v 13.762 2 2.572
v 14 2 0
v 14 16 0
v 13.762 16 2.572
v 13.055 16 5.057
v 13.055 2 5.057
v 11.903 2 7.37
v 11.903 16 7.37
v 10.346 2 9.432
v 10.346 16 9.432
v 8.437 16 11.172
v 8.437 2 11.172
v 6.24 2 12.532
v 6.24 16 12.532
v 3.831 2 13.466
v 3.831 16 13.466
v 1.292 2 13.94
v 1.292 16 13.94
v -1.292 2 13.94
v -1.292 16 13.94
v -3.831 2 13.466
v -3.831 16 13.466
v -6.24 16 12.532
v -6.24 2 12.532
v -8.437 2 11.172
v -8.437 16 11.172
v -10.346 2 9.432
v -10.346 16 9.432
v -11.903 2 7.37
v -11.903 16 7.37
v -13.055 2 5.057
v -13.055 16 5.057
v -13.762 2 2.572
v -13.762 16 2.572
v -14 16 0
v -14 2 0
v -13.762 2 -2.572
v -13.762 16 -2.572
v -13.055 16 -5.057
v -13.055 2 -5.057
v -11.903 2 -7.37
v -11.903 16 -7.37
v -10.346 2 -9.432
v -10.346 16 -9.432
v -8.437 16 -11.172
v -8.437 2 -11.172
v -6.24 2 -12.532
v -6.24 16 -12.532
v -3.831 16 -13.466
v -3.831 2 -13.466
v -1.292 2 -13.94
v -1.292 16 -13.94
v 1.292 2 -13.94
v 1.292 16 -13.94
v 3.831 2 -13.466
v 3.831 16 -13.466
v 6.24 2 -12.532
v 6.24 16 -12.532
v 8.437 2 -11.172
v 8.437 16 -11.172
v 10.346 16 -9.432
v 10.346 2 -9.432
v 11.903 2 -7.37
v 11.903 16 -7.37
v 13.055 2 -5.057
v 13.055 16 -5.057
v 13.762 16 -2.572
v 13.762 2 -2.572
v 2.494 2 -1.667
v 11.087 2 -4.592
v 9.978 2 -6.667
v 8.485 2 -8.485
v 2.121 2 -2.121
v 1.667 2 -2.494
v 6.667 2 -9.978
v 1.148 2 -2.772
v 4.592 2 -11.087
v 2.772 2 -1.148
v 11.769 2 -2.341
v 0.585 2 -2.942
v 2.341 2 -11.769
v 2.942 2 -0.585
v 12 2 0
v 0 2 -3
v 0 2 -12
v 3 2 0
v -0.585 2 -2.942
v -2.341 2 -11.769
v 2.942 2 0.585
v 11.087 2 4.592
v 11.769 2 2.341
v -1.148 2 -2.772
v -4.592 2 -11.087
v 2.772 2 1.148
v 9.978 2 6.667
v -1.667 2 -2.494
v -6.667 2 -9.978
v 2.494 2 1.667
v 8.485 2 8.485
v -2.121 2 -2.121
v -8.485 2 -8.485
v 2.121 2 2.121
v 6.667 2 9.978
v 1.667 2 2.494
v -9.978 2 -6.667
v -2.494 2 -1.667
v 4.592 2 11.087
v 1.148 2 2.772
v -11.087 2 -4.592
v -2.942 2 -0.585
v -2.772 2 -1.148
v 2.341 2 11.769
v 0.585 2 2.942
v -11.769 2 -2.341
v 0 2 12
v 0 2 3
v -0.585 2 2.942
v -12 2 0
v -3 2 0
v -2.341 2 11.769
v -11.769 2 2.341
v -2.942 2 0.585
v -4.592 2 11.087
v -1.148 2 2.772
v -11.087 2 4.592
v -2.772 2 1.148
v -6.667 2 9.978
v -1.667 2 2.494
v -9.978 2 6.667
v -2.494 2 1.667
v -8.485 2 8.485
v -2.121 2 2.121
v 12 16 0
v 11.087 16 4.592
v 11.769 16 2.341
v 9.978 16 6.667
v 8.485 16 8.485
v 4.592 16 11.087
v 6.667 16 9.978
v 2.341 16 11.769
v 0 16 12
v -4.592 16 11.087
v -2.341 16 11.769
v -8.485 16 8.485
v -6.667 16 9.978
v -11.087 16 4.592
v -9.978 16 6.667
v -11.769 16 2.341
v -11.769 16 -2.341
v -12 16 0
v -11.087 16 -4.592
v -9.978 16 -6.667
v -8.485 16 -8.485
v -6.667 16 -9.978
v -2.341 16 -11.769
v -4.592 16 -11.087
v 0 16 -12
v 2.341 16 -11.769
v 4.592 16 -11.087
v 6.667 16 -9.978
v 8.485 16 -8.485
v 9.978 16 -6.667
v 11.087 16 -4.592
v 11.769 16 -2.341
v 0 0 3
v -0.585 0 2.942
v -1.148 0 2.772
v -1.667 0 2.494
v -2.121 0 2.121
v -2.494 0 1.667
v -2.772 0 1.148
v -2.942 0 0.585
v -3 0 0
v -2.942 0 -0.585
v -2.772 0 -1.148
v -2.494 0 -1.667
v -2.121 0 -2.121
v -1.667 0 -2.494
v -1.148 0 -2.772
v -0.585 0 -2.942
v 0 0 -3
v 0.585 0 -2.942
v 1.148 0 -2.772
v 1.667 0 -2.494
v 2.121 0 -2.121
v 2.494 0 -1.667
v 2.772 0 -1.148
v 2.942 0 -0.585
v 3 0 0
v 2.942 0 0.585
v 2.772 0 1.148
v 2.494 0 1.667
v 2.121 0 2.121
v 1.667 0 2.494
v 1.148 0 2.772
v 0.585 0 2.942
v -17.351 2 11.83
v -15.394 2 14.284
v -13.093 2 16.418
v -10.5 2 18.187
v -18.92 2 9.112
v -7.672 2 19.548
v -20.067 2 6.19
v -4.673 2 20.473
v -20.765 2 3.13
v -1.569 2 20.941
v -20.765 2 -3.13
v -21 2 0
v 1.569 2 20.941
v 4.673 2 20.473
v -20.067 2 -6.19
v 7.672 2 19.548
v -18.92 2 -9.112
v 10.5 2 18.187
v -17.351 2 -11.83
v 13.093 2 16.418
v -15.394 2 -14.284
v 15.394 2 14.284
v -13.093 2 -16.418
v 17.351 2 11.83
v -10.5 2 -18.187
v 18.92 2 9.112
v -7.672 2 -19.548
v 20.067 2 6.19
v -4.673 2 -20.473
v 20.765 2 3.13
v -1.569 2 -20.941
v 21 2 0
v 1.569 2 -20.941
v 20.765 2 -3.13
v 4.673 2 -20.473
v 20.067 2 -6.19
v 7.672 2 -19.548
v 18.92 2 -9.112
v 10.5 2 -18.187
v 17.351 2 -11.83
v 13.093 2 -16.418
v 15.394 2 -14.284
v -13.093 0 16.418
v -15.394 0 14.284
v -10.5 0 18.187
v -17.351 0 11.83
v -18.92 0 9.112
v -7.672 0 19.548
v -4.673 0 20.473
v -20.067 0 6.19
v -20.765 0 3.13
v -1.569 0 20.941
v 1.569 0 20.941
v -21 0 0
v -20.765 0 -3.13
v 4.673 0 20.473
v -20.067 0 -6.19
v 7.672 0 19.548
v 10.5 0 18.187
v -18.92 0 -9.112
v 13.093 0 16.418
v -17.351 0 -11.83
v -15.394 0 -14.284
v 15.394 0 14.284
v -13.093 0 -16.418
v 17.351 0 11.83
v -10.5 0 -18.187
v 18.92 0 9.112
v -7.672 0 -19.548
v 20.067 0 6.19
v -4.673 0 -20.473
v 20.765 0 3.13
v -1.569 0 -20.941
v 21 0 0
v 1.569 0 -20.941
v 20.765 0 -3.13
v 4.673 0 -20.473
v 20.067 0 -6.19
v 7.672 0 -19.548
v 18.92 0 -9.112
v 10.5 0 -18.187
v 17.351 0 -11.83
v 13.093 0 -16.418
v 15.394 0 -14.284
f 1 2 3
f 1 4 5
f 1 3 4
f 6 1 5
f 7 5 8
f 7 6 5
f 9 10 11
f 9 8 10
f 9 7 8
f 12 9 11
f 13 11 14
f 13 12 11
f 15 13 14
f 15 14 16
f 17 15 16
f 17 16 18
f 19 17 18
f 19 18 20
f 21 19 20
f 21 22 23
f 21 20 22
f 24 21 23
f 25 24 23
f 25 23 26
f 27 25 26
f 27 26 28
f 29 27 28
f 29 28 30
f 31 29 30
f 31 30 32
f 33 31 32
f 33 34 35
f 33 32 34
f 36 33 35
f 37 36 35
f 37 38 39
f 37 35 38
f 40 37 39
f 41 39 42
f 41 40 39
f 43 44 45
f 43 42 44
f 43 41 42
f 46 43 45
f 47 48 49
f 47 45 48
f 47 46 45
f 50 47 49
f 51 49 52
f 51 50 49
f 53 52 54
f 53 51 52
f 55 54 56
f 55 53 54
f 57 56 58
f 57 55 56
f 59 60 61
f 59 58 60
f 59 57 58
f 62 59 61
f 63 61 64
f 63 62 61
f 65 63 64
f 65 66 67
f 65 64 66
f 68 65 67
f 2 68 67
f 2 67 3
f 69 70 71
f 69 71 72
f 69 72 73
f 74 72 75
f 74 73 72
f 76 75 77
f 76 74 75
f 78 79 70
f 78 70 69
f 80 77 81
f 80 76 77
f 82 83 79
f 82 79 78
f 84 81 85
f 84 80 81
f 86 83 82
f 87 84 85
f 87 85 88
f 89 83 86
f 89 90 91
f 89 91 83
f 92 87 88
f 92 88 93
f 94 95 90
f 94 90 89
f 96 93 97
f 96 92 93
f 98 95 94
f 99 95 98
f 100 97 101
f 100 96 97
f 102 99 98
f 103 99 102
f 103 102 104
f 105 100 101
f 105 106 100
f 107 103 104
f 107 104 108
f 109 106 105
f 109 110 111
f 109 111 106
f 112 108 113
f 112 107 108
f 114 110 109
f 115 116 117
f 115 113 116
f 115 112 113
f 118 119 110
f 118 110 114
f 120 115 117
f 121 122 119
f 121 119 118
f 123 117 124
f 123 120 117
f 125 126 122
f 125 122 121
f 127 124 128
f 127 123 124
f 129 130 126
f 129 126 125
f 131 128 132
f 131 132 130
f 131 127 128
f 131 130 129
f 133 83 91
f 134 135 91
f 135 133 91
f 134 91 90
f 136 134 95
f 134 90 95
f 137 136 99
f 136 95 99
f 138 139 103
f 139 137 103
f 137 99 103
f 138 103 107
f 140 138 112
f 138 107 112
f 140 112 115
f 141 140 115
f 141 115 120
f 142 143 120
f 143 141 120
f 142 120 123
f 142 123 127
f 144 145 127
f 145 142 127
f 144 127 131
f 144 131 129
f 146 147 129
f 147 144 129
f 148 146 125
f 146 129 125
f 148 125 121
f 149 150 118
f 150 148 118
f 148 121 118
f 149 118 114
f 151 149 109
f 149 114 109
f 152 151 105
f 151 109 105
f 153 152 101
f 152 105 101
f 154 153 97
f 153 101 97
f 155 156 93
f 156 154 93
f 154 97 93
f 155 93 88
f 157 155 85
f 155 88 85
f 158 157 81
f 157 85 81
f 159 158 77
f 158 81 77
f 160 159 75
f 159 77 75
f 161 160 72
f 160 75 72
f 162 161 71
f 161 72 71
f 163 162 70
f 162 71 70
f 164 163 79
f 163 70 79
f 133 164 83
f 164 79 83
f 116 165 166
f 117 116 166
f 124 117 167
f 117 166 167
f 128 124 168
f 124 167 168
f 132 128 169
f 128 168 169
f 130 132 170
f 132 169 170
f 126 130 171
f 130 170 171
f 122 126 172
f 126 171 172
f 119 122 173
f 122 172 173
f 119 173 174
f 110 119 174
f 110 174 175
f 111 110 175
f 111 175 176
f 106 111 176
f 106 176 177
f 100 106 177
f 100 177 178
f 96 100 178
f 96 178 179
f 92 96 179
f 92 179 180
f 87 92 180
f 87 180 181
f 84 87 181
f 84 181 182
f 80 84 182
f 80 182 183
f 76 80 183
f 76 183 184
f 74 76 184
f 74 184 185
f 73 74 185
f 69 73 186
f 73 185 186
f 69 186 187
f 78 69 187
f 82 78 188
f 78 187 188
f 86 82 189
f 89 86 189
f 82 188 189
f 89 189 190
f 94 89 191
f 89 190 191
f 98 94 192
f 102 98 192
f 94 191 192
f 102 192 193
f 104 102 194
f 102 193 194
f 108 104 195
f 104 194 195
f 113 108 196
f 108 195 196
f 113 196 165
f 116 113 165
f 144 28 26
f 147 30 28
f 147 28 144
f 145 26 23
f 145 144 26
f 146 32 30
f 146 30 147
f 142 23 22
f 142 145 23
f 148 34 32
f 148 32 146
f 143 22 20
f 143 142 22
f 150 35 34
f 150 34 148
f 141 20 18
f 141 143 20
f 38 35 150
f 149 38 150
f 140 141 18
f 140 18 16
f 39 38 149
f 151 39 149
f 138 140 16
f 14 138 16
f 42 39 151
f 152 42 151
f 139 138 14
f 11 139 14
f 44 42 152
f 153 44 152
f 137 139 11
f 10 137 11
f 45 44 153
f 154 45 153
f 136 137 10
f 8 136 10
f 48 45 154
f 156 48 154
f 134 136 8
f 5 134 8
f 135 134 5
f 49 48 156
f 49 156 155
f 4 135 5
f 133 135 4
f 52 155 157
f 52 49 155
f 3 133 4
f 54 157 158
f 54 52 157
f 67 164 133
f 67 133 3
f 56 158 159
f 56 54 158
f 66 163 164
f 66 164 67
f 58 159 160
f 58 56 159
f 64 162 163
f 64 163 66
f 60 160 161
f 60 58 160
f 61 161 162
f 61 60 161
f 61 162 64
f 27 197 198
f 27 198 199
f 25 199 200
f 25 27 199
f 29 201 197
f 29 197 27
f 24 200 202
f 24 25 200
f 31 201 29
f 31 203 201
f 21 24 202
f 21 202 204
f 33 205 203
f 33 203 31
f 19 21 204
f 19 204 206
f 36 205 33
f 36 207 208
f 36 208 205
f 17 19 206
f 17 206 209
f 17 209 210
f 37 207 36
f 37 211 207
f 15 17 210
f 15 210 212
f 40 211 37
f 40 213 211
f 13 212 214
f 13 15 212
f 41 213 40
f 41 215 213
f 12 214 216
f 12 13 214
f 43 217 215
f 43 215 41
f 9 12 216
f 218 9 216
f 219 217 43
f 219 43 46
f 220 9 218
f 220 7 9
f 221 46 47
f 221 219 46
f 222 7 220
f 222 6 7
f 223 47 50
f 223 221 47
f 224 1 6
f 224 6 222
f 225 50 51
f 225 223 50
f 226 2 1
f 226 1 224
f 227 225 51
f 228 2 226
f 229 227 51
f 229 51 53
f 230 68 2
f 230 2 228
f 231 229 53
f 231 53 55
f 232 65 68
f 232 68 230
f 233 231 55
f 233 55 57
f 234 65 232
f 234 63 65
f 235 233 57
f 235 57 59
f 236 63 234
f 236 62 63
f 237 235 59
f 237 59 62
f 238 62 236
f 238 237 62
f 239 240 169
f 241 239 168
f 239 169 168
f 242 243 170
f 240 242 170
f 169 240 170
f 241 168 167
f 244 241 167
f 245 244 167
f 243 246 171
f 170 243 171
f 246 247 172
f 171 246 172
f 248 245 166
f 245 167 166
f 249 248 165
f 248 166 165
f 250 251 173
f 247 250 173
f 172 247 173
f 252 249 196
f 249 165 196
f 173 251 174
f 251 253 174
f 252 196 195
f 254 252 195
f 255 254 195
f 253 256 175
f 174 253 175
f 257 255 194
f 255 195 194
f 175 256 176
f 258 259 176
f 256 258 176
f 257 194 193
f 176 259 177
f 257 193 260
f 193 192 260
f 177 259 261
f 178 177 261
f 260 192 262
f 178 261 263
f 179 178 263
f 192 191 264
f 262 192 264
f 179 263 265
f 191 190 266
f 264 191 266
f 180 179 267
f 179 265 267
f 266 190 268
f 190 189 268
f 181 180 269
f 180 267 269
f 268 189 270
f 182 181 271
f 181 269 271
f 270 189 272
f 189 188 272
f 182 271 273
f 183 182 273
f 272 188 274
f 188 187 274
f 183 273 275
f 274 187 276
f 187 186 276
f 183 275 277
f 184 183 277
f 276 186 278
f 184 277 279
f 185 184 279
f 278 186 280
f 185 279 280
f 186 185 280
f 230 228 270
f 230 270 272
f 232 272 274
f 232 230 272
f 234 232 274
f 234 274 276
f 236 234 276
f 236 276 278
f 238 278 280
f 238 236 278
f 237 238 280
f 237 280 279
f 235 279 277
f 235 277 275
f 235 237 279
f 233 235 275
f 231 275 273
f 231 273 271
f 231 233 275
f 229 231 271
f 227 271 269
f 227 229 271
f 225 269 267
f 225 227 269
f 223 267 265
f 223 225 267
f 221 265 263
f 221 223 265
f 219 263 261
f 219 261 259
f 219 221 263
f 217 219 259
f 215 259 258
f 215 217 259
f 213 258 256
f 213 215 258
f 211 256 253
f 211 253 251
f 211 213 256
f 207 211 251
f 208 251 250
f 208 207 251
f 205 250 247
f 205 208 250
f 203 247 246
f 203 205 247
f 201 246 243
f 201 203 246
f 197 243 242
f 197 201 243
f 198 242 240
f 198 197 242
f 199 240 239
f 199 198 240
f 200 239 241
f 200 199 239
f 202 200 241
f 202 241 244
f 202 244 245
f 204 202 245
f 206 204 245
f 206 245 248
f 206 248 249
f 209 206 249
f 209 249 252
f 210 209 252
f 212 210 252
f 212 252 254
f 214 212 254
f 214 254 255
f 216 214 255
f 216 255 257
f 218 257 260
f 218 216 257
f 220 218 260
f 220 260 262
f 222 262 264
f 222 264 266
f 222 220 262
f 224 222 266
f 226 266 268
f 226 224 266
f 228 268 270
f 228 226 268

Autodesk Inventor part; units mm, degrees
ref_plane "YZ Plane" through (0, 0, 0) normal (1, 0, 0) x (0, 1, 0)
ref_plane "XZ Plane" through (0, 0, 0) normal (0, 1, 0) x (-1, 0, 0)
ref_plane "XY Plane" through (0, 0, 0) normal (0, 0, 1) x (1, 0, 0)
sketch "Sketch1" plane through (0, 0, 0) normal (0, 1, 0) x (-1, 0, 0)
  circle A0 centre (0, 0) radius 18
  dimension "d0" = 36
extrude "Extrusion1" add sketch "Sketch1" along normal blind 2
sketch "Sketch2" plane through (0, 2, 0) normal (0, 1, 0) x (1, 0, 0)
  circle A0 centre (0, 0) radius 12
  circle A1 centre (0, 0) radius 14
  dimension "d5" = 24
  dimension "d6" = 28
extrude "Extrusion2" add sketch "Sketch2" along normal blind 14
sketch "Sketch3" plane through (0, 2, 0) normal (0, 1, 0) x (1, 0, 0)
  circle A0 centre (0, 0) radius 3
  dimension "d9" = 6
hole "Hole1" at (0, 2, 0) direction (0, -1, 0) diameter 6 end through all
sketch "Sketch4" plane through (0, 2, 0) normal (0, 1, 0) x (1, 0, 0)
  circle A0 centre (0, 0) radius 21
  dimension "d17" = 42
extrude "Extrusion3" add sketch "Sketch4" against normal blind 2
sketch "Sketch5" plane through (0, 2, 0) normal (0, 1, 0) x (1, 0, 0)
  point P0 (0, 0)
  point P1 (0, 0)
hole "Hole2" at (0, 2, 0) direction (0, -1, 0) diameter 6 end through all
properties part number "foot_bearings_holder" material "PET Plastic"
